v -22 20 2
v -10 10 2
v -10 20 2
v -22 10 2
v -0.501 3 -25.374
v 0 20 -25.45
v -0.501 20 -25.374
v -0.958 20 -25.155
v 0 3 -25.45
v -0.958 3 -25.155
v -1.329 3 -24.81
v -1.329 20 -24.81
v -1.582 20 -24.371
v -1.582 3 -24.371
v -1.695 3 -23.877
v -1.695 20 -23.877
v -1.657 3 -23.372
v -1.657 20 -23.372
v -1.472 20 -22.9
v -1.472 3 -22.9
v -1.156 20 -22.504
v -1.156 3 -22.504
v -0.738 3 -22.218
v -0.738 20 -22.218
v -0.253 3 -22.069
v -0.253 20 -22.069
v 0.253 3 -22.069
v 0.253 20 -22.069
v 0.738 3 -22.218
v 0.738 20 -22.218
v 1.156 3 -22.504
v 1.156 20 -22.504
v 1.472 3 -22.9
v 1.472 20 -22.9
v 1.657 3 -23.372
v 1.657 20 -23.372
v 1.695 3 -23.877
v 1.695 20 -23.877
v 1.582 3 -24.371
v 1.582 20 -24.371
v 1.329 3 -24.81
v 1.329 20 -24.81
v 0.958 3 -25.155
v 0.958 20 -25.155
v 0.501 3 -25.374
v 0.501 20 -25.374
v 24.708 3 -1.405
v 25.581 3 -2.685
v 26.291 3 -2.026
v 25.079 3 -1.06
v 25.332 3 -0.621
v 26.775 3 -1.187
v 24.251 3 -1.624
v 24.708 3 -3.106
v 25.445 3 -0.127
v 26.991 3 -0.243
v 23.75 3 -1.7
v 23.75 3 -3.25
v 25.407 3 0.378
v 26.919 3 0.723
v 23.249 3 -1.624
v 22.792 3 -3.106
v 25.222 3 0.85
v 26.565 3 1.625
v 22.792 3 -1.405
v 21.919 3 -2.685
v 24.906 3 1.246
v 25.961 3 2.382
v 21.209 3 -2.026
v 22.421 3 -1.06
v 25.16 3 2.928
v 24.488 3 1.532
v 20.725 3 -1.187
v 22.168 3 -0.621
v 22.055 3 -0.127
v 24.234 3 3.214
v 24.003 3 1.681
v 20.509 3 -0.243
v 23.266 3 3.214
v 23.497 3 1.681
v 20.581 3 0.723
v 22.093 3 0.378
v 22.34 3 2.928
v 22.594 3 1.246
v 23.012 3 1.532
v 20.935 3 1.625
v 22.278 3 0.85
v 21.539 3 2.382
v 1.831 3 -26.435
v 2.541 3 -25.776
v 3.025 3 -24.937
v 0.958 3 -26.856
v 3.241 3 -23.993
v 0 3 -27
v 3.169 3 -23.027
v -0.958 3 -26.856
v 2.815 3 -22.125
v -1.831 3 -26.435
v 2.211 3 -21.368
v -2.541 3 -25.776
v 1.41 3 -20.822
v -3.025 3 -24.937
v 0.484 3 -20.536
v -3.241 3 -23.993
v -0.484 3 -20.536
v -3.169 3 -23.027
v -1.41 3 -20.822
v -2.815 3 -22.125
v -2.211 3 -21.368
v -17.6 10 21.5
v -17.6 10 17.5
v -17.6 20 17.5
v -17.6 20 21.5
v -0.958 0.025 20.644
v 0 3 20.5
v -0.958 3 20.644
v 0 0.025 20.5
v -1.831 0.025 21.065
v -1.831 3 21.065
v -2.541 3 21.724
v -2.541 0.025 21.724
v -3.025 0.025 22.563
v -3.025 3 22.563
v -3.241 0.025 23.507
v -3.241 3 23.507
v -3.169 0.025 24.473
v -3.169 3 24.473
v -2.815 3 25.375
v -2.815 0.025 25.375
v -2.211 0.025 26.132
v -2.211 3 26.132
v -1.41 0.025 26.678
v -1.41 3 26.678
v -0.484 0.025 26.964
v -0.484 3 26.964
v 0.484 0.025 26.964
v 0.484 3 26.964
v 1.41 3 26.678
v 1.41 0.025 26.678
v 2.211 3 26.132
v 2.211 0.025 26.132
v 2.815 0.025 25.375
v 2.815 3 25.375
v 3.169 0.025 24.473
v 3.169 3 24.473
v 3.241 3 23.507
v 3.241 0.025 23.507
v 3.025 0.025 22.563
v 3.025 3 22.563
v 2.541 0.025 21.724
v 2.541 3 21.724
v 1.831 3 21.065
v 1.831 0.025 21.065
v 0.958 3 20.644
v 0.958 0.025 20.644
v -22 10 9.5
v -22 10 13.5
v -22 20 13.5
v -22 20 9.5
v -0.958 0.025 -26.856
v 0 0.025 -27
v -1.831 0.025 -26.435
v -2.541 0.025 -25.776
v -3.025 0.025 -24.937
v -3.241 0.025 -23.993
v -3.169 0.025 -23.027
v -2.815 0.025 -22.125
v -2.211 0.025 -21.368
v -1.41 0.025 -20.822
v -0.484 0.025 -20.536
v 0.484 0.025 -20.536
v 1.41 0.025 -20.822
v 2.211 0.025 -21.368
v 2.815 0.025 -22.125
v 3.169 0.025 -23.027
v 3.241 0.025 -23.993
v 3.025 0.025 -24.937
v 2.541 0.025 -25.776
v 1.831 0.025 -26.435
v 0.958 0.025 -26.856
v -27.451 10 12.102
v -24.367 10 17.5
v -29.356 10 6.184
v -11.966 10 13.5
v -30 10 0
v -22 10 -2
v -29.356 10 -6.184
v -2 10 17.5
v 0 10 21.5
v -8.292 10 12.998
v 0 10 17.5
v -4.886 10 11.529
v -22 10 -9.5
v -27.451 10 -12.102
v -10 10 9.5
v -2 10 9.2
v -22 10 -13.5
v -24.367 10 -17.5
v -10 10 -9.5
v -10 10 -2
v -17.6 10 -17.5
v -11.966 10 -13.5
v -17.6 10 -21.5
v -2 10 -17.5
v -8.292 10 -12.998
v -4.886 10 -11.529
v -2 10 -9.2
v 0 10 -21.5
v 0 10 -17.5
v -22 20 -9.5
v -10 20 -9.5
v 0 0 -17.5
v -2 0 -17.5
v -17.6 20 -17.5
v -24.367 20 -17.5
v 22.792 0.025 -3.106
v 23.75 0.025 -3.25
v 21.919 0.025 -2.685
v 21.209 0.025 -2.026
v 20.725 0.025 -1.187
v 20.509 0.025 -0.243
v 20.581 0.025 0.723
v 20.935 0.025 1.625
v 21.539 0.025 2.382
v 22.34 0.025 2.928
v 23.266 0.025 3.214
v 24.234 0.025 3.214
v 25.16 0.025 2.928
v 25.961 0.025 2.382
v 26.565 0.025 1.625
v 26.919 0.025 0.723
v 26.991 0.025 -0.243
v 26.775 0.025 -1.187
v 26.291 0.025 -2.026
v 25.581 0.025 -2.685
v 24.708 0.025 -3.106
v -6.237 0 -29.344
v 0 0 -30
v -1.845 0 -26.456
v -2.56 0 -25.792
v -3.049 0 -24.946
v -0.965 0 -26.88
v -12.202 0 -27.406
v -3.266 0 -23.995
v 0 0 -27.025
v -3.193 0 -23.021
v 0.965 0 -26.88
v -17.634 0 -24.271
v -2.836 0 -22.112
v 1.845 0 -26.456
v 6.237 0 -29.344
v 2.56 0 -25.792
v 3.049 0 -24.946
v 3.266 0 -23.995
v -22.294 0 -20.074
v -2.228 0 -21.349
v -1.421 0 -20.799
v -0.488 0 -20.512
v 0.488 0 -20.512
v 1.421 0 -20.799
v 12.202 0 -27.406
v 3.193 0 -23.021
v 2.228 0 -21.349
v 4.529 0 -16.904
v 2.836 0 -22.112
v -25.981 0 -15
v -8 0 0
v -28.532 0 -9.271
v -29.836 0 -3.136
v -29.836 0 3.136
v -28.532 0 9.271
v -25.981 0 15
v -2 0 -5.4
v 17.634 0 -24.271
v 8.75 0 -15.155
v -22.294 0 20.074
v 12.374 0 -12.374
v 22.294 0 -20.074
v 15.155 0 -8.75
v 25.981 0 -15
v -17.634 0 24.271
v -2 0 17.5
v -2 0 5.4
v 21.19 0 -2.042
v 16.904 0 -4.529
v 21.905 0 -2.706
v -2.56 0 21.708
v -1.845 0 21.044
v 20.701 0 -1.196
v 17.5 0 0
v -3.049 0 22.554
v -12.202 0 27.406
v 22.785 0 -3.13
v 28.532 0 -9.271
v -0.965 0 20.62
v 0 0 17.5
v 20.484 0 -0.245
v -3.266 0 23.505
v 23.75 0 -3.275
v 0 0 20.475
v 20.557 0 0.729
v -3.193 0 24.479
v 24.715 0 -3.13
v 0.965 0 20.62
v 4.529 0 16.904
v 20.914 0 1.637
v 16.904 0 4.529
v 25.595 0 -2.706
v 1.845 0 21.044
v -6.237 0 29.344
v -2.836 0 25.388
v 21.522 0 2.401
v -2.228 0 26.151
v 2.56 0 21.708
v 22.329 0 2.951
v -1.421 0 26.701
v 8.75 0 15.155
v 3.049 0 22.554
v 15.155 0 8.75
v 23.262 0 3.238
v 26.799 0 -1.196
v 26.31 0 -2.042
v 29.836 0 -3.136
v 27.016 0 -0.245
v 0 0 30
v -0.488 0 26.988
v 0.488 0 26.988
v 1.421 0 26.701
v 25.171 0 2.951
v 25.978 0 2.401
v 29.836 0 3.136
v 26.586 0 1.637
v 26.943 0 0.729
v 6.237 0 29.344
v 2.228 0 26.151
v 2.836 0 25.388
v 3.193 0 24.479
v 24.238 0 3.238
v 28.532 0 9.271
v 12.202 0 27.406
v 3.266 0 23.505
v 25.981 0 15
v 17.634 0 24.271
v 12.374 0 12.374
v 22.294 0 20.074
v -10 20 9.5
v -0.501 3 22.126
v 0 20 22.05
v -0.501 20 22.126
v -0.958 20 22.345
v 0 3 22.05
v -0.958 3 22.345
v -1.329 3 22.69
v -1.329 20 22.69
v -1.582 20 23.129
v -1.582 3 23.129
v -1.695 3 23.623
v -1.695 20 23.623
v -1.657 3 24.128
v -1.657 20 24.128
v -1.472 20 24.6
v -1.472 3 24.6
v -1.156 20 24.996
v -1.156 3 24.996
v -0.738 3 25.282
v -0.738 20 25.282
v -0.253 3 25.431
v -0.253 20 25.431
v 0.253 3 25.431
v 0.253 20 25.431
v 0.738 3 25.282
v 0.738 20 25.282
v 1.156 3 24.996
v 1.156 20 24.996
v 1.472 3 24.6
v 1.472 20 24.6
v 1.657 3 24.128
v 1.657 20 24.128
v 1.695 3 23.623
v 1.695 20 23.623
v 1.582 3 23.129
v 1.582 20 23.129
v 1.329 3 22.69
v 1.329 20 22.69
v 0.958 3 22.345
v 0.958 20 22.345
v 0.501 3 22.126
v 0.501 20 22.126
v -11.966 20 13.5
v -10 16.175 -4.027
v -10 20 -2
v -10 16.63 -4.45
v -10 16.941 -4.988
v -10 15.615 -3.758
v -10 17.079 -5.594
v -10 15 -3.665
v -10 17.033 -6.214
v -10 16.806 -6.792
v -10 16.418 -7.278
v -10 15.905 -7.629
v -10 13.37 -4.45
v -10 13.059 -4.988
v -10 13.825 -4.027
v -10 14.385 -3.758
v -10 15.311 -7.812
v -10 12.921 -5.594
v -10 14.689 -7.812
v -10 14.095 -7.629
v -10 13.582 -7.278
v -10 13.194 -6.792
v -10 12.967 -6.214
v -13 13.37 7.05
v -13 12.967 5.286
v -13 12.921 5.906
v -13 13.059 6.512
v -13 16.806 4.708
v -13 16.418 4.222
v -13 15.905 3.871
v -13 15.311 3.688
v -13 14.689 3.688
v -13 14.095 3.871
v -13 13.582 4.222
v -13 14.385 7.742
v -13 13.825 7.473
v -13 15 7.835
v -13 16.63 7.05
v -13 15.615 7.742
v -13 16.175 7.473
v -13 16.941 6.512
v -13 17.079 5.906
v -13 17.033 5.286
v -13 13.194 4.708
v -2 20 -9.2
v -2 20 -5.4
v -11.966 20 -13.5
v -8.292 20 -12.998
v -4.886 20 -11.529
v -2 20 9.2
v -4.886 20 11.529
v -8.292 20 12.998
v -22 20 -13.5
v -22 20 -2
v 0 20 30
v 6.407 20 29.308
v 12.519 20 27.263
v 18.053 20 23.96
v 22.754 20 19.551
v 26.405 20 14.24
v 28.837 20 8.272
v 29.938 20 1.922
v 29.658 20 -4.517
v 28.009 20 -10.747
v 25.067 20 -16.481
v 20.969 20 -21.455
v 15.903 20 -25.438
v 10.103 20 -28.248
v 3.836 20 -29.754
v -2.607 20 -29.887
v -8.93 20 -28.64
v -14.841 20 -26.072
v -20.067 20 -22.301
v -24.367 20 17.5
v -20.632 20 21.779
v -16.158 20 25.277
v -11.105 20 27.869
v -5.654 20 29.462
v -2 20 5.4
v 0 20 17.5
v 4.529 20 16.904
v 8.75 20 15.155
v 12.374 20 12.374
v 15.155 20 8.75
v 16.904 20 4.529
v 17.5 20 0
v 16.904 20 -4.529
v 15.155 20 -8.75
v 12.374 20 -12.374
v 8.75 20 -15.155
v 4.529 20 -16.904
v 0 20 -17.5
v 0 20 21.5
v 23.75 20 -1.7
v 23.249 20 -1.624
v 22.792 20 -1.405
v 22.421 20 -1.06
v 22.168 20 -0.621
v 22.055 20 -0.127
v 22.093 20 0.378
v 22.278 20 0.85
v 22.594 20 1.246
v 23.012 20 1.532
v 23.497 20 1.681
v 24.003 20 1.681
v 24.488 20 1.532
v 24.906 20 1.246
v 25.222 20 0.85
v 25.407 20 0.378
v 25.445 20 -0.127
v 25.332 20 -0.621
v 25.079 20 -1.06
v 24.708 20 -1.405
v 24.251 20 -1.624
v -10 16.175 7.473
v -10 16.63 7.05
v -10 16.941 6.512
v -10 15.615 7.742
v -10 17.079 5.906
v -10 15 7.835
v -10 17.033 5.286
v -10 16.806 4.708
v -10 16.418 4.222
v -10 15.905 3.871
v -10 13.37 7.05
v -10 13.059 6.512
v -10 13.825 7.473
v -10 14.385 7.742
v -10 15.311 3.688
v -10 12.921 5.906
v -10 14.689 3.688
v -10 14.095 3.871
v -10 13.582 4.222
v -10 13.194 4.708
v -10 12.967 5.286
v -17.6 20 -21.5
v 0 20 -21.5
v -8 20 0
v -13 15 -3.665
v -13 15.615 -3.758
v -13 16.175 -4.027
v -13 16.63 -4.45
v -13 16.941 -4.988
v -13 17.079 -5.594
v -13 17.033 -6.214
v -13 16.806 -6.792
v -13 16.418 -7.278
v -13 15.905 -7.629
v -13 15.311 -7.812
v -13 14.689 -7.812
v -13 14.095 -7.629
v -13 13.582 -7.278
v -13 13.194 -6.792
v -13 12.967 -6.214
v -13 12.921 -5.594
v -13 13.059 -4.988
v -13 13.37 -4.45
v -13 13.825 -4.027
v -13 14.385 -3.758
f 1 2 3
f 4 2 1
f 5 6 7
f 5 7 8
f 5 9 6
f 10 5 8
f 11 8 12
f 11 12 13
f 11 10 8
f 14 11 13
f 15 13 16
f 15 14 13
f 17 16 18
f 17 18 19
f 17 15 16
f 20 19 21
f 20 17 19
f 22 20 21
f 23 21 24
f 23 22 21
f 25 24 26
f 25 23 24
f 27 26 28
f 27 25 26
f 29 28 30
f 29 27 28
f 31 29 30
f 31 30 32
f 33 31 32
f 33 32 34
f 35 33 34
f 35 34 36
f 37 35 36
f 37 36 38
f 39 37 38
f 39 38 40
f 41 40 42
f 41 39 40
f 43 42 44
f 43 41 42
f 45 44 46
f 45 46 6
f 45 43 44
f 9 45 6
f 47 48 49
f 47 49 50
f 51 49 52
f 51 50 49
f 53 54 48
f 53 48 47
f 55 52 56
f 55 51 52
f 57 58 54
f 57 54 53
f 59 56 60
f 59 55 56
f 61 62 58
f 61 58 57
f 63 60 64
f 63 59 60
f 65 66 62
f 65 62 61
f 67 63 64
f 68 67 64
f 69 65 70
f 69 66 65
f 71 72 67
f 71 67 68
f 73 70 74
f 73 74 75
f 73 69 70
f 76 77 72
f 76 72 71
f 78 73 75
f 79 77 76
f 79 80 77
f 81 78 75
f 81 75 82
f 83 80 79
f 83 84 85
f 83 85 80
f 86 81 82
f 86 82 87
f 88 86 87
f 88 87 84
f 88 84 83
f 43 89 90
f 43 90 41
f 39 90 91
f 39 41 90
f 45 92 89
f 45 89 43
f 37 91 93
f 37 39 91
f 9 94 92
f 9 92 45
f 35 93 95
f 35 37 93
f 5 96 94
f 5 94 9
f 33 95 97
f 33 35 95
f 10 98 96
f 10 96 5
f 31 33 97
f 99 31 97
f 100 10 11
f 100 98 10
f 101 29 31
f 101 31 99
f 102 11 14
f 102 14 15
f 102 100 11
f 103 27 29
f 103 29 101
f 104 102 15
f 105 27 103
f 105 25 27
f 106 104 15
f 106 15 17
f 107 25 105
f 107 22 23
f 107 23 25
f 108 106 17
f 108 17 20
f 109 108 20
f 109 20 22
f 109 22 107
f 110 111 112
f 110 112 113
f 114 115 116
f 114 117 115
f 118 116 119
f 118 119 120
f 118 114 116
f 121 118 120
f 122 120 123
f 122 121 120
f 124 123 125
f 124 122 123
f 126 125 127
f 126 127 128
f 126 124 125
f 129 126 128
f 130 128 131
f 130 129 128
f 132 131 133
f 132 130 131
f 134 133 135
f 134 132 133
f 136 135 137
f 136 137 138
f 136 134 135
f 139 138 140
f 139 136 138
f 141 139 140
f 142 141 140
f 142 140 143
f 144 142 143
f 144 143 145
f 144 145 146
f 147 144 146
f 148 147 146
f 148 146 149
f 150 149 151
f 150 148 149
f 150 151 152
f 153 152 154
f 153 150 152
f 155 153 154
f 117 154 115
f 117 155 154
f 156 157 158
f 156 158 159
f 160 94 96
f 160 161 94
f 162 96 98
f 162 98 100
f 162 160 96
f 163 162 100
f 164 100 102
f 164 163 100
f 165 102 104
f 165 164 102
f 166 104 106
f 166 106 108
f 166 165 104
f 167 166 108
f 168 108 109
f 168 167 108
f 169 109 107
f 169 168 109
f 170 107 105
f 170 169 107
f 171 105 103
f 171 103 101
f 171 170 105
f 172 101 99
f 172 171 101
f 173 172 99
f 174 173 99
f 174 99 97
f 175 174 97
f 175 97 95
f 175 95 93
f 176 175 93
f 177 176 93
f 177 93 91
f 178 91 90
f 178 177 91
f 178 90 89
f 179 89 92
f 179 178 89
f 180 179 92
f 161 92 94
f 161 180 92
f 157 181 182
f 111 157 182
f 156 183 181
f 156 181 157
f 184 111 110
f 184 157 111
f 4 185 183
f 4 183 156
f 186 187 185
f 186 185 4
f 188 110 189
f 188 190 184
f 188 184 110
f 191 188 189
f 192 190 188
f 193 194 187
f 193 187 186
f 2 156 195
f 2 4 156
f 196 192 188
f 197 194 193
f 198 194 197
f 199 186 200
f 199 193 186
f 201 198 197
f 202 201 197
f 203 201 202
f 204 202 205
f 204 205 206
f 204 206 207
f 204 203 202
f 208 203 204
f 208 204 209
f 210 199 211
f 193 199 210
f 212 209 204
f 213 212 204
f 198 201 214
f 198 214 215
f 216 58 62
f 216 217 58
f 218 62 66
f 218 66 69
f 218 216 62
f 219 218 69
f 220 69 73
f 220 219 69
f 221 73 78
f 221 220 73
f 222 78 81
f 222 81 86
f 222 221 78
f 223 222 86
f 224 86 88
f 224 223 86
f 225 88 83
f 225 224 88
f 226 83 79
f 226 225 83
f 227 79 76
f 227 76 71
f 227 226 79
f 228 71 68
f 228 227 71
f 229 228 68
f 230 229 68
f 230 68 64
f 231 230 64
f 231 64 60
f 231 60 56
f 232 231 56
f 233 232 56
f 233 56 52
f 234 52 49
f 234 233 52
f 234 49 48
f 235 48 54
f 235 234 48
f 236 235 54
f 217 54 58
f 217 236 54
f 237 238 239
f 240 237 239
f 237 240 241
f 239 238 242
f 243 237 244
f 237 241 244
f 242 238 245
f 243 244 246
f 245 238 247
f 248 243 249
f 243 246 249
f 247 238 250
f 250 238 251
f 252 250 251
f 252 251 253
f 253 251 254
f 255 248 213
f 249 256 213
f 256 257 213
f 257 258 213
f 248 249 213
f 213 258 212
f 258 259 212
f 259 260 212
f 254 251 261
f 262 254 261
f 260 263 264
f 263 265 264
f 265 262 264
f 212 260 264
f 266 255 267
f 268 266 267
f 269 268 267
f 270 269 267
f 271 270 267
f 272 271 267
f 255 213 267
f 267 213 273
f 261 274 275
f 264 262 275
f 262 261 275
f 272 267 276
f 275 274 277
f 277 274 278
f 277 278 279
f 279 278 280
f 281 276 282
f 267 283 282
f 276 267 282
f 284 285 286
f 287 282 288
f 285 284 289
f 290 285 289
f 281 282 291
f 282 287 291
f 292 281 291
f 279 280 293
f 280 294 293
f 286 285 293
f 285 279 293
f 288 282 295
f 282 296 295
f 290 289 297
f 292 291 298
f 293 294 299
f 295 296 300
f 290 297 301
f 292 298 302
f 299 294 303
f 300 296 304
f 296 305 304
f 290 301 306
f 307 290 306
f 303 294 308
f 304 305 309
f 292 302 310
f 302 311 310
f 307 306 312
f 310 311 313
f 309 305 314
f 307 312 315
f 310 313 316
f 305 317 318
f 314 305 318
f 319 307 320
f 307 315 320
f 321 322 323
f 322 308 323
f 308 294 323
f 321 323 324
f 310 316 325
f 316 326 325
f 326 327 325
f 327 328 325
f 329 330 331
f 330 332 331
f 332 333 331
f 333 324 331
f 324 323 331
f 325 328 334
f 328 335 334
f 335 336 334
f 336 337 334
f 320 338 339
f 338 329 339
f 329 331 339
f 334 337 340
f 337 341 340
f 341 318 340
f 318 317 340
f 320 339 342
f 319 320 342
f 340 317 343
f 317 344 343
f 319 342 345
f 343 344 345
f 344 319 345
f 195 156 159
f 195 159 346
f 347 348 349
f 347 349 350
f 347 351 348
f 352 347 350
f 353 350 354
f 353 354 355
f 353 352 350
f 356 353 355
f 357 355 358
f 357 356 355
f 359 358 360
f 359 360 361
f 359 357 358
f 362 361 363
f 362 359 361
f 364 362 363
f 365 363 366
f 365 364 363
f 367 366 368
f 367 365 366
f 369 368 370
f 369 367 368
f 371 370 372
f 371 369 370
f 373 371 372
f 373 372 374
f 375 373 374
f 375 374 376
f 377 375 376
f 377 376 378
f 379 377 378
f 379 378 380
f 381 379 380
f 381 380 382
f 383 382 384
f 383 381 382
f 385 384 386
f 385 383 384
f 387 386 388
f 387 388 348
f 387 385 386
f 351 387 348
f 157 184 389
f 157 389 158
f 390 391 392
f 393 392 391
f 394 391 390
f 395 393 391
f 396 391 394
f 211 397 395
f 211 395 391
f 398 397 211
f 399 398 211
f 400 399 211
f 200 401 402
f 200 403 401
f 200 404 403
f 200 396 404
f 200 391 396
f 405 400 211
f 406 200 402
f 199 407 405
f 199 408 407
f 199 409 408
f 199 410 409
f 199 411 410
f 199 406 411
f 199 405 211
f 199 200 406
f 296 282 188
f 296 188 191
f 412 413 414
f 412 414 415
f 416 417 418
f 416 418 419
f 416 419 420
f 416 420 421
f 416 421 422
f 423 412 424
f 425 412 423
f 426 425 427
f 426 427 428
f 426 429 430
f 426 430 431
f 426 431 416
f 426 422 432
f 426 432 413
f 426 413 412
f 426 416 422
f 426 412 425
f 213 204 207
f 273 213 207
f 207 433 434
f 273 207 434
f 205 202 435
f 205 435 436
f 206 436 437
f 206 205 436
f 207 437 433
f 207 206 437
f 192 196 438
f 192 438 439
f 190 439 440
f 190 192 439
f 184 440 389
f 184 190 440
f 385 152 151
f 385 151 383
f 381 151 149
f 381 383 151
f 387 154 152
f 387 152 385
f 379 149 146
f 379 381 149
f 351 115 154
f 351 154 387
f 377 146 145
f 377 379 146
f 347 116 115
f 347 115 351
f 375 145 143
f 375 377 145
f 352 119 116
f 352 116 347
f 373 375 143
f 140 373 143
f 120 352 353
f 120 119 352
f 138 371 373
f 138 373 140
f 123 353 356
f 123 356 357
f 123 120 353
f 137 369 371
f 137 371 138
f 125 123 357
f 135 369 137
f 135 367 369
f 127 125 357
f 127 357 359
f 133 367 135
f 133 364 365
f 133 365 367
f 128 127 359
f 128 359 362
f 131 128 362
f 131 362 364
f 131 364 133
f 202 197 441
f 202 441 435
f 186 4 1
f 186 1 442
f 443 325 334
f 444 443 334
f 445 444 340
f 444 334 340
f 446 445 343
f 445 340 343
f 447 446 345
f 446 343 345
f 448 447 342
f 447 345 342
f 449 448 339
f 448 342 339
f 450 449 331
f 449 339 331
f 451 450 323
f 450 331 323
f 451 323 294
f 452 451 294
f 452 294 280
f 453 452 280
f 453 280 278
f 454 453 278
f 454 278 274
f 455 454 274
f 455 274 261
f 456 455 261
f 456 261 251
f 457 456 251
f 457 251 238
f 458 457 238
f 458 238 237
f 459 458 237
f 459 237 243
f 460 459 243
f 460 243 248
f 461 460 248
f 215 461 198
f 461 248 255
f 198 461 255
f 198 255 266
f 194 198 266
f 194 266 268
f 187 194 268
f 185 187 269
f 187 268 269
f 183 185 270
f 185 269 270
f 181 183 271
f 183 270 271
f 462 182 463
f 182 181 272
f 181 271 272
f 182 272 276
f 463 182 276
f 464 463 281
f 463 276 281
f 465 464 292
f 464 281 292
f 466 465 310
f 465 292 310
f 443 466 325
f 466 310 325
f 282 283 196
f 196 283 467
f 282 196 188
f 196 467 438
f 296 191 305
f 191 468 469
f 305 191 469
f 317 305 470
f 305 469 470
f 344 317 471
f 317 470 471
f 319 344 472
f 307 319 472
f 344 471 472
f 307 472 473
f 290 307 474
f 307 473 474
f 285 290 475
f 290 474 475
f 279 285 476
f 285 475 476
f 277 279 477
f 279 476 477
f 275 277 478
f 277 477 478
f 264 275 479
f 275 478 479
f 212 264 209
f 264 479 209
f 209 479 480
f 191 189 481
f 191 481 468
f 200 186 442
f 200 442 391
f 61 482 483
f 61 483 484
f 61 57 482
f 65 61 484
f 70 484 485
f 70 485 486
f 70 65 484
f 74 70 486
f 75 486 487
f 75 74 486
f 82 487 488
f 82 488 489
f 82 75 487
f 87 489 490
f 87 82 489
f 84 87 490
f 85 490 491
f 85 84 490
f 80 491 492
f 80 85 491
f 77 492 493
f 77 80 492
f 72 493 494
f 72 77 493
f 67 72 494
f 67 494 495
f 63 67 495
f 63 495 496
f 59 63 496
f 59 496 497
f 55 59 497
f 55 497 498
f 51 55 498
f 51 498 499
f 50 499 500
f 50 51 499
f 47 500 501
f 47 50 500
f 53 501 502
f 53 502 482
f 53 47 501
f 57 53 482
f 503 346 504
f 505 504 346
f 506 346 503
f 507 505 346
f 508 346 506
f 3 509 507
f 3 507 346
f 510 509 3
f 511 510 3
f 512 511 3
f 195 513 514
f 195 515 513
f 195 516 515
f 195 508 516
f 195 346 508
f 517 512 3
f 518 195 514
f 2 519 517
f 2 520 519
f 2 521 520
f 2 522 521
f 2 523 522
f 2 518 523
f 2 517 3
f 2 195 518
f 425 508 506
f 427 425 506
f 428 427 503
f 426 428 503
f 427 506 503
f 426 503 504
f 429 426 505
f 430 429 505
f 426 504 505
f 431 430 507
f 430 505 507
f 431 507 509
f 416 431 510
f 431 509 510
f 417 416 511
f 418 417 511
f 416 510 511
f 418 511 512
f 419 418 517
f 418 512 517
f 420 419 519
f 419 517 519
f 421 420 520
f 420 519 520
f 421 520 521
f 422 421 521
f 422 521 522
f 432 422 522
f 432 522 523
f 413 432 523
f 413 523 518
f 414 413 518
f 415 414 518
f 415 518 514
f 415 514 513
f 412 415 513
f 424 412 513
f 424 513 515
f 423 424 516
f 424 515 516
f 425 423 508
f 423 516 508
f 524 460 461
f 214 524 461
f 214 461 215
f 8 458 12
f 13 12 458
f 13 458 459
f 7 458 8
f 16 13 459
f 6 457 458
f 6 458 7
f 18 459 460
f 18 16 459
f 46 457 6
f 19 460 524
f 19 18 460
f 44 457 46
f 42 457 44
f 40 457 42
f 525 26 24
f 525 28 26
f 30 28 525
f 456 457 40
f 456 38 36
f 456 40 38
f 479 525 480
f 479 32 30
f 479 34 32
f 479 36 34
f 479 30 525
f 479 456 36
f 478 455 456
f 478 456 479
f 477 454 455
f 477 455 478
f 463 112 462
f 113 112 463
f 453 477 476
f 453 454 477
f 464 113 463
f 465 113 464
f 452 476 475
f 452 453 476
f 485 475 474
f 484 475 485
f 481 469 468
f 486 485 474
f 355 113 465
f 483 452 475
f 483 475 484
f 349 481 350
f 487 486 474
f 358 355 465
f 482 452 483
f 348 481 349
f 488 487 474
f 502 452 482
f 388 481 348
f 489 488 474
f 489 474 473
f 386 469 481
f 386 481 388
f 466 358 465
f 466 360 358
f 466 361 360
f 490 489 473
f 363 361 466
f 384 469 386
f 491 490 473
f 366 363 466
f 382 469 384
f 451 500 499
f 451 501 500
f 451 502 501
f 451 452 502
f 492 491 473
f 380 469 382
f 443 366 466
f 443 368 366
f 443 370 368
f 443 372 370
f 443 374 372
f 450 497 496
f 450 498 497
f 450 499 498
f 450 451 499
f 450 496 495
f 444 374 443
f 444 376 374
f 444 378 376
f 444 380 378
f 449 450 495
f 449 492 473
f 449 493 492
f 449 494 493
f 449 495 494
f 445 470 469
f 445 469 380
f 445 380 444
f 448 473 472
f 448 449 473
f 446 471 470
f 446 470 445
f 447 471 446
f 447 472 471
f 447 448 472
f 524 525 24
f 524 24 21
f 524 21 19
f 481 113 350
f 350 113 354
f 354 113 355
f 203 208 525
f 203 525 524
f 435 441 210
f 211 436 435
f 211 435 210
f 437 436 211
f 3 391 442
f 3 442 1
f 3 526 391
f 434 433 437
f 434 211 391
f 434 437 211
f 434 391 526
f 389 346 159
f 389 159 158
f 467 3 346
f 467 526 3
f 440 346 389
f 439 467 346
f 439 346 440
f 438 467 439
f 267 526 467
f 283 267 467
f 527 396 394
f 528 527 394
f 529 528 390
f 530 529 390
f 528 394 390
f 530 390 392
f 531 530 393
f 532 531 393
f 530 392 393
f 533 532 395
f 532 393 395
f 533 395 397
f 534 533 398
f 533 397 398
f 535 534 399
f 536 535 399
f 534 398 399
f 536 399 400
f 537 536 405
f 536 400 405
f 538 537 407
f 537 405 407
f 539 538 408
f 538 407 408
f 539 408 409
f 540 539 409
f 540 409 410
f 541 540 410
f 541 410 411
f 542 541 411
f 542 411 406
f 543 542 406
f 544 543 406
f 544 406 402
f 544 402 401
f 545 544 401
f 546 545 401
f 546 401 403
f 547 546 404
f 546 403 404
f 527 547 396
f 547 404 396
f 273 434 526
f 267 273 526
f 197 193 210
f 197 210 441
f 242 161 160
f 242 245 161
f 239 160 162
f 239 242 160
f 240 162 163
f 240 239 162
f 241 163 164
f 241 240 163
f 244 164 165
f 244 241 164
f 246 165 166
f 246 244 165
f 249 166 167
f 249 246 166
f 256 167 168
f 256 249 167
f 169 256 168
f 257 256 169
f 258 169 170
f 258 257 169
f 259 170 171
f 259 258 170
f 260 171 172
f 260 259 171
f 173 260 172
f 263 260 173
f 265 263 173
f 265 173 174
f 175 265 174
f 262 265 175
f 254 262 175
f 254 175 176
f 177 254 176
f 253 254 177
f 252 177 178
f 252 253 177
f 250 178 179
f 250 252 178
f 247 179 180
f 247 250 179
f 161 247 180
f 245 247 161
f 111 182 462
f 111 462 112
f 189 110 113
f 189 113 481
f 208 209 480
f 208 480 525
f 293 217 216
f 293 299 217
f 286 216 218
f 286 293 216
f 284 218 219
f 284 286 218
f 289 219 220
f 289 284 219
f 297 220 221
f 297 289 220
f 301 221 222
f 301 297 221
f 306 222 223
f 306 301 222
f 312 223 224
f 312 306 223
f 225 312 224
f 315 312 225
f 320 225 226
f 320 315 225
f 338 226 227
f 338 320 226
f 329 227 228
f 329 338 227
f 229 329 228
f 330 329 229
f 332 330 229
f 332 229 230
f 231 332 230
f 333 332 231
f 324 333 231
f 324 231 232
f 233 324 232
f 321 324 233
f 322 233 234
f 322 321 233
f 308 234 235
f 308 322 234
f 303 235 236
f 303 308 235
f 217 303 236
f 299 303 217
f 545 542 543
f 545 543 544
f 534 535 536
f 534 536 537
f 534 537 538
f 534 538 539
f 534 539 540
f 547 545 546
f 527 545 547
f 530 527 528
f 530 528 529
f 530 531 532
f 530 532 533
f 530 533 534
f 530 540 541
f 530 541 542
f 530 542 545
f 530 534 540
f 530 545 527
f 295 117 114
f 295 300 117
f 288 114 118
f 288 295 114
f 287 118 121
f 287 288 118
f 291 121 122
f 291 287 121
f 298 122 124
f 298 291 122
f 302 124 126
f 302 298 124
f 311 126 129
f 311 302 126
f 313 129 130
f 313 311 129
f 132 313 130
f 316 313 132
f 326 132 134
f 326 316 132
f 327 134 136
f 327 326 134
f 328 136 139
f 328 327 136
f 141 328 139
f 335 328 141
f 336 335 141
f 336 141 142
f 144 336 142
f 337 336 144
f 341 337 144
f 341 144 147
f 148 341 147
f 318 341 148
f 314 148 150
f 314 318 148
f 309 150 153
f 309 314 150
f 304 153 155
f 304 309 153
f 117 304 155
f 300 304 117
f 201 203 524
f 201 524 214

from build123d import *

# Parameters (mm, degrees)
SKETCH2_R                     = 30
BOSS_EXTRUDE1_DEPTH           = 20
CUT_EXTRUDE2_DEPTH            = 47.904157598
CUT_EXTRUDE3_START            = -10
CUT_EXTRUDE3_DEPTH            = 10
CBORE_FOR_M3_SHCS1_AT_2_COUNT = 2
CBORE_FOR_M3_SHCS1_AT_2_PITCH = 33.587572106
CBORE_FOR_M3_SHCS1_AT_3_COUNT = 2
CBORE_FOR_M3_SHCS1_AT_3_PITCH = 47.5
SKETCH6_R                     = 2.085
BOSS_EXTRUDE2_DEPTH           = 3


with BuildPart() as part:
    # Sketch2 → Boss-Extrude1 (new body)
    with BuildSketch(Plane(origin=(0, 0, 0), x_dir=(1, 0, 0), z_dir=(0, 1, 0))):
        Circle(SKETCH2_R)
    extrude(amount=BOSS_EXTRUDE1_DEPTH)

    # Sketch3 → Cut-Extrude2 (cut, through all)
    with BuildSketch(Plane(origin=(0, 20, 0), x_dir=(1, 0, 0), z_dir=(0, 1, 0))):
        with BuildLine():
            ThreePointArc((0, -17.5), (17.5, 0), (0, 17.5))
            Line((0, 17.5), (-2, 17.5))
            Line((-2, 17.5), (-2, 9.2))
            Line((-2, 9.2), (-2, 5.4))
            Line((-2, 5.4), (-8, 0))
            Line((-8, 0), (-2, -5.4))
            Line((-2, -5.4), (-2, -9.2))
            Line((-2, -9.2), (-2, -17.5))
            Line((-2, -17.5), (0, -17.5))
        make_face()
    extrude(amount=-CUT_EXTRUDE2_DEPTH, mode=Mode.SUBTRACT)

    # Sketch3<3> → Cut-Extrude3 (cut)
    with BuildSketch(Plane(origin=(0, 20, 0), x_dir=(1, 0, 0), z_dir=(0, 1, 0)).offset(CUT_EXTRUDE3_START)):
        with BuildLine():
            Line((-17.6, 17.5), (-24.366985862, 17.5))
            ThreePointArc((-24.366985862, 17.5), (-30, 0), (-24.366985862, -17.5))
            Line((-24.366985862, -17.5), (-17.6, -17.5))
            Line((-17.6, -17.5), (-17.6, -21.5))
            Line((-17.6, -21.5), (0, -21.5))
            Line((0, -21.5), (0, -17.5))
            Line((0, -17.5), (-2, -17.5))
            Line((-2, -17.5), (-2, -9.2))
            ThreePointArc((-2, -9.2), (-6.53919762, -12.379149415), (-11.966443699, -13.5))
            Line((-11.966443699, -13.5), (-22, -13.5))
            Line((-22, -13.5), (-22, -9.5))
            Line((-22, -9.5), (-10, -9.5))
            Line((-10, -9.5), (-10, -2))
            Line((-10, -2), (-22, -2))
            Line((-22, -2), (-22, 2))
            Line((-22, 2), (-10, 2))
            Line((-10, 2), (-10, 9.5))
            Line((-10, 9.5), (-22, 9.5))
            Line((-22, 9.5), (-22, 13.5))
            Line((-22, 13.5), (-11.966443699, 13.5))
            ThreePointArc((-11.966443699, 13.5), (-6.53919762, 12.379149415), (-2, 9.2))
            Line((-2, 9.2), (-2, 17.5))
            Line((-2, 17.5), (0, 17.5))
            Line((0, 17.5), (0, 21.5))
            Line((0, 21.5), (-17.6, 21.5))
            Line((-17.6, 21.5), (-17.6, 17.5))
        make_face()
    extrude(amount=CUT_EXTRUDE3_DEPTH, mode=Mode.SUBTRACT)

    # Sketch5 → CBORE for M3 SHCS1 (revolve, cut)
    with BuildSketch(Plane(origin=(0, 0, -23.75), x_dir=(0, 0, -1), z_dir=(1, 0, 0))):
        Polygon((0, 0), (0, 20), (1.7, 20), (1.7, 3), (3.25, 3), (3.25, 0.025), (3.275, 0), align=None)
    cbore_for_m3_shcs1 = revolve(axis=Axis((0, -6.35, -23.75), (0, 1, 0)), mode=Mode.SUBTRACT)

    # CBORE for M3 SHCS1 at 2: CBORE for M3 SHCS1 ×2
    with Locations(*[Vector(0.7071067811865476, 0, 0.7071067811865476) * (i * CBORE_FOR_M3_SHCS1_AT_2_PITCH) for i in range(1, CBORE_FOR_M3_SHCS1_AT_2_COUNT)]):
        add(cbore_for_m3_shcs1, mode=Mode.SUBTRACT)

    # CBORE for M3 SHCS1 at 3: CBORE for M3 SHCS1 ×2
    with Locations(*[(0, 0, i * CBORE_FOR_M3_SHCS1_AT_3_PITCH) for i in range(1, CBORE_FOR_M3_SHCS1_AT_3_COUNT)]):
        add(cbore_for_m3_shcs1, mode=Mode.SUBTRACT)

    # Sketch6 → Boss-Extrude2 (add)
    with BuildSketch(Plane.ZY.offset(10)):
        with Locations((-5.75, 15)):
            Circle(SKETCH6_R)
        with Locations((5.75, 15)):
            Circle(SKETCH6_R)
    extrude(amount=BOSS_EXTRUDE2_DEPTH)


solid = part.part
